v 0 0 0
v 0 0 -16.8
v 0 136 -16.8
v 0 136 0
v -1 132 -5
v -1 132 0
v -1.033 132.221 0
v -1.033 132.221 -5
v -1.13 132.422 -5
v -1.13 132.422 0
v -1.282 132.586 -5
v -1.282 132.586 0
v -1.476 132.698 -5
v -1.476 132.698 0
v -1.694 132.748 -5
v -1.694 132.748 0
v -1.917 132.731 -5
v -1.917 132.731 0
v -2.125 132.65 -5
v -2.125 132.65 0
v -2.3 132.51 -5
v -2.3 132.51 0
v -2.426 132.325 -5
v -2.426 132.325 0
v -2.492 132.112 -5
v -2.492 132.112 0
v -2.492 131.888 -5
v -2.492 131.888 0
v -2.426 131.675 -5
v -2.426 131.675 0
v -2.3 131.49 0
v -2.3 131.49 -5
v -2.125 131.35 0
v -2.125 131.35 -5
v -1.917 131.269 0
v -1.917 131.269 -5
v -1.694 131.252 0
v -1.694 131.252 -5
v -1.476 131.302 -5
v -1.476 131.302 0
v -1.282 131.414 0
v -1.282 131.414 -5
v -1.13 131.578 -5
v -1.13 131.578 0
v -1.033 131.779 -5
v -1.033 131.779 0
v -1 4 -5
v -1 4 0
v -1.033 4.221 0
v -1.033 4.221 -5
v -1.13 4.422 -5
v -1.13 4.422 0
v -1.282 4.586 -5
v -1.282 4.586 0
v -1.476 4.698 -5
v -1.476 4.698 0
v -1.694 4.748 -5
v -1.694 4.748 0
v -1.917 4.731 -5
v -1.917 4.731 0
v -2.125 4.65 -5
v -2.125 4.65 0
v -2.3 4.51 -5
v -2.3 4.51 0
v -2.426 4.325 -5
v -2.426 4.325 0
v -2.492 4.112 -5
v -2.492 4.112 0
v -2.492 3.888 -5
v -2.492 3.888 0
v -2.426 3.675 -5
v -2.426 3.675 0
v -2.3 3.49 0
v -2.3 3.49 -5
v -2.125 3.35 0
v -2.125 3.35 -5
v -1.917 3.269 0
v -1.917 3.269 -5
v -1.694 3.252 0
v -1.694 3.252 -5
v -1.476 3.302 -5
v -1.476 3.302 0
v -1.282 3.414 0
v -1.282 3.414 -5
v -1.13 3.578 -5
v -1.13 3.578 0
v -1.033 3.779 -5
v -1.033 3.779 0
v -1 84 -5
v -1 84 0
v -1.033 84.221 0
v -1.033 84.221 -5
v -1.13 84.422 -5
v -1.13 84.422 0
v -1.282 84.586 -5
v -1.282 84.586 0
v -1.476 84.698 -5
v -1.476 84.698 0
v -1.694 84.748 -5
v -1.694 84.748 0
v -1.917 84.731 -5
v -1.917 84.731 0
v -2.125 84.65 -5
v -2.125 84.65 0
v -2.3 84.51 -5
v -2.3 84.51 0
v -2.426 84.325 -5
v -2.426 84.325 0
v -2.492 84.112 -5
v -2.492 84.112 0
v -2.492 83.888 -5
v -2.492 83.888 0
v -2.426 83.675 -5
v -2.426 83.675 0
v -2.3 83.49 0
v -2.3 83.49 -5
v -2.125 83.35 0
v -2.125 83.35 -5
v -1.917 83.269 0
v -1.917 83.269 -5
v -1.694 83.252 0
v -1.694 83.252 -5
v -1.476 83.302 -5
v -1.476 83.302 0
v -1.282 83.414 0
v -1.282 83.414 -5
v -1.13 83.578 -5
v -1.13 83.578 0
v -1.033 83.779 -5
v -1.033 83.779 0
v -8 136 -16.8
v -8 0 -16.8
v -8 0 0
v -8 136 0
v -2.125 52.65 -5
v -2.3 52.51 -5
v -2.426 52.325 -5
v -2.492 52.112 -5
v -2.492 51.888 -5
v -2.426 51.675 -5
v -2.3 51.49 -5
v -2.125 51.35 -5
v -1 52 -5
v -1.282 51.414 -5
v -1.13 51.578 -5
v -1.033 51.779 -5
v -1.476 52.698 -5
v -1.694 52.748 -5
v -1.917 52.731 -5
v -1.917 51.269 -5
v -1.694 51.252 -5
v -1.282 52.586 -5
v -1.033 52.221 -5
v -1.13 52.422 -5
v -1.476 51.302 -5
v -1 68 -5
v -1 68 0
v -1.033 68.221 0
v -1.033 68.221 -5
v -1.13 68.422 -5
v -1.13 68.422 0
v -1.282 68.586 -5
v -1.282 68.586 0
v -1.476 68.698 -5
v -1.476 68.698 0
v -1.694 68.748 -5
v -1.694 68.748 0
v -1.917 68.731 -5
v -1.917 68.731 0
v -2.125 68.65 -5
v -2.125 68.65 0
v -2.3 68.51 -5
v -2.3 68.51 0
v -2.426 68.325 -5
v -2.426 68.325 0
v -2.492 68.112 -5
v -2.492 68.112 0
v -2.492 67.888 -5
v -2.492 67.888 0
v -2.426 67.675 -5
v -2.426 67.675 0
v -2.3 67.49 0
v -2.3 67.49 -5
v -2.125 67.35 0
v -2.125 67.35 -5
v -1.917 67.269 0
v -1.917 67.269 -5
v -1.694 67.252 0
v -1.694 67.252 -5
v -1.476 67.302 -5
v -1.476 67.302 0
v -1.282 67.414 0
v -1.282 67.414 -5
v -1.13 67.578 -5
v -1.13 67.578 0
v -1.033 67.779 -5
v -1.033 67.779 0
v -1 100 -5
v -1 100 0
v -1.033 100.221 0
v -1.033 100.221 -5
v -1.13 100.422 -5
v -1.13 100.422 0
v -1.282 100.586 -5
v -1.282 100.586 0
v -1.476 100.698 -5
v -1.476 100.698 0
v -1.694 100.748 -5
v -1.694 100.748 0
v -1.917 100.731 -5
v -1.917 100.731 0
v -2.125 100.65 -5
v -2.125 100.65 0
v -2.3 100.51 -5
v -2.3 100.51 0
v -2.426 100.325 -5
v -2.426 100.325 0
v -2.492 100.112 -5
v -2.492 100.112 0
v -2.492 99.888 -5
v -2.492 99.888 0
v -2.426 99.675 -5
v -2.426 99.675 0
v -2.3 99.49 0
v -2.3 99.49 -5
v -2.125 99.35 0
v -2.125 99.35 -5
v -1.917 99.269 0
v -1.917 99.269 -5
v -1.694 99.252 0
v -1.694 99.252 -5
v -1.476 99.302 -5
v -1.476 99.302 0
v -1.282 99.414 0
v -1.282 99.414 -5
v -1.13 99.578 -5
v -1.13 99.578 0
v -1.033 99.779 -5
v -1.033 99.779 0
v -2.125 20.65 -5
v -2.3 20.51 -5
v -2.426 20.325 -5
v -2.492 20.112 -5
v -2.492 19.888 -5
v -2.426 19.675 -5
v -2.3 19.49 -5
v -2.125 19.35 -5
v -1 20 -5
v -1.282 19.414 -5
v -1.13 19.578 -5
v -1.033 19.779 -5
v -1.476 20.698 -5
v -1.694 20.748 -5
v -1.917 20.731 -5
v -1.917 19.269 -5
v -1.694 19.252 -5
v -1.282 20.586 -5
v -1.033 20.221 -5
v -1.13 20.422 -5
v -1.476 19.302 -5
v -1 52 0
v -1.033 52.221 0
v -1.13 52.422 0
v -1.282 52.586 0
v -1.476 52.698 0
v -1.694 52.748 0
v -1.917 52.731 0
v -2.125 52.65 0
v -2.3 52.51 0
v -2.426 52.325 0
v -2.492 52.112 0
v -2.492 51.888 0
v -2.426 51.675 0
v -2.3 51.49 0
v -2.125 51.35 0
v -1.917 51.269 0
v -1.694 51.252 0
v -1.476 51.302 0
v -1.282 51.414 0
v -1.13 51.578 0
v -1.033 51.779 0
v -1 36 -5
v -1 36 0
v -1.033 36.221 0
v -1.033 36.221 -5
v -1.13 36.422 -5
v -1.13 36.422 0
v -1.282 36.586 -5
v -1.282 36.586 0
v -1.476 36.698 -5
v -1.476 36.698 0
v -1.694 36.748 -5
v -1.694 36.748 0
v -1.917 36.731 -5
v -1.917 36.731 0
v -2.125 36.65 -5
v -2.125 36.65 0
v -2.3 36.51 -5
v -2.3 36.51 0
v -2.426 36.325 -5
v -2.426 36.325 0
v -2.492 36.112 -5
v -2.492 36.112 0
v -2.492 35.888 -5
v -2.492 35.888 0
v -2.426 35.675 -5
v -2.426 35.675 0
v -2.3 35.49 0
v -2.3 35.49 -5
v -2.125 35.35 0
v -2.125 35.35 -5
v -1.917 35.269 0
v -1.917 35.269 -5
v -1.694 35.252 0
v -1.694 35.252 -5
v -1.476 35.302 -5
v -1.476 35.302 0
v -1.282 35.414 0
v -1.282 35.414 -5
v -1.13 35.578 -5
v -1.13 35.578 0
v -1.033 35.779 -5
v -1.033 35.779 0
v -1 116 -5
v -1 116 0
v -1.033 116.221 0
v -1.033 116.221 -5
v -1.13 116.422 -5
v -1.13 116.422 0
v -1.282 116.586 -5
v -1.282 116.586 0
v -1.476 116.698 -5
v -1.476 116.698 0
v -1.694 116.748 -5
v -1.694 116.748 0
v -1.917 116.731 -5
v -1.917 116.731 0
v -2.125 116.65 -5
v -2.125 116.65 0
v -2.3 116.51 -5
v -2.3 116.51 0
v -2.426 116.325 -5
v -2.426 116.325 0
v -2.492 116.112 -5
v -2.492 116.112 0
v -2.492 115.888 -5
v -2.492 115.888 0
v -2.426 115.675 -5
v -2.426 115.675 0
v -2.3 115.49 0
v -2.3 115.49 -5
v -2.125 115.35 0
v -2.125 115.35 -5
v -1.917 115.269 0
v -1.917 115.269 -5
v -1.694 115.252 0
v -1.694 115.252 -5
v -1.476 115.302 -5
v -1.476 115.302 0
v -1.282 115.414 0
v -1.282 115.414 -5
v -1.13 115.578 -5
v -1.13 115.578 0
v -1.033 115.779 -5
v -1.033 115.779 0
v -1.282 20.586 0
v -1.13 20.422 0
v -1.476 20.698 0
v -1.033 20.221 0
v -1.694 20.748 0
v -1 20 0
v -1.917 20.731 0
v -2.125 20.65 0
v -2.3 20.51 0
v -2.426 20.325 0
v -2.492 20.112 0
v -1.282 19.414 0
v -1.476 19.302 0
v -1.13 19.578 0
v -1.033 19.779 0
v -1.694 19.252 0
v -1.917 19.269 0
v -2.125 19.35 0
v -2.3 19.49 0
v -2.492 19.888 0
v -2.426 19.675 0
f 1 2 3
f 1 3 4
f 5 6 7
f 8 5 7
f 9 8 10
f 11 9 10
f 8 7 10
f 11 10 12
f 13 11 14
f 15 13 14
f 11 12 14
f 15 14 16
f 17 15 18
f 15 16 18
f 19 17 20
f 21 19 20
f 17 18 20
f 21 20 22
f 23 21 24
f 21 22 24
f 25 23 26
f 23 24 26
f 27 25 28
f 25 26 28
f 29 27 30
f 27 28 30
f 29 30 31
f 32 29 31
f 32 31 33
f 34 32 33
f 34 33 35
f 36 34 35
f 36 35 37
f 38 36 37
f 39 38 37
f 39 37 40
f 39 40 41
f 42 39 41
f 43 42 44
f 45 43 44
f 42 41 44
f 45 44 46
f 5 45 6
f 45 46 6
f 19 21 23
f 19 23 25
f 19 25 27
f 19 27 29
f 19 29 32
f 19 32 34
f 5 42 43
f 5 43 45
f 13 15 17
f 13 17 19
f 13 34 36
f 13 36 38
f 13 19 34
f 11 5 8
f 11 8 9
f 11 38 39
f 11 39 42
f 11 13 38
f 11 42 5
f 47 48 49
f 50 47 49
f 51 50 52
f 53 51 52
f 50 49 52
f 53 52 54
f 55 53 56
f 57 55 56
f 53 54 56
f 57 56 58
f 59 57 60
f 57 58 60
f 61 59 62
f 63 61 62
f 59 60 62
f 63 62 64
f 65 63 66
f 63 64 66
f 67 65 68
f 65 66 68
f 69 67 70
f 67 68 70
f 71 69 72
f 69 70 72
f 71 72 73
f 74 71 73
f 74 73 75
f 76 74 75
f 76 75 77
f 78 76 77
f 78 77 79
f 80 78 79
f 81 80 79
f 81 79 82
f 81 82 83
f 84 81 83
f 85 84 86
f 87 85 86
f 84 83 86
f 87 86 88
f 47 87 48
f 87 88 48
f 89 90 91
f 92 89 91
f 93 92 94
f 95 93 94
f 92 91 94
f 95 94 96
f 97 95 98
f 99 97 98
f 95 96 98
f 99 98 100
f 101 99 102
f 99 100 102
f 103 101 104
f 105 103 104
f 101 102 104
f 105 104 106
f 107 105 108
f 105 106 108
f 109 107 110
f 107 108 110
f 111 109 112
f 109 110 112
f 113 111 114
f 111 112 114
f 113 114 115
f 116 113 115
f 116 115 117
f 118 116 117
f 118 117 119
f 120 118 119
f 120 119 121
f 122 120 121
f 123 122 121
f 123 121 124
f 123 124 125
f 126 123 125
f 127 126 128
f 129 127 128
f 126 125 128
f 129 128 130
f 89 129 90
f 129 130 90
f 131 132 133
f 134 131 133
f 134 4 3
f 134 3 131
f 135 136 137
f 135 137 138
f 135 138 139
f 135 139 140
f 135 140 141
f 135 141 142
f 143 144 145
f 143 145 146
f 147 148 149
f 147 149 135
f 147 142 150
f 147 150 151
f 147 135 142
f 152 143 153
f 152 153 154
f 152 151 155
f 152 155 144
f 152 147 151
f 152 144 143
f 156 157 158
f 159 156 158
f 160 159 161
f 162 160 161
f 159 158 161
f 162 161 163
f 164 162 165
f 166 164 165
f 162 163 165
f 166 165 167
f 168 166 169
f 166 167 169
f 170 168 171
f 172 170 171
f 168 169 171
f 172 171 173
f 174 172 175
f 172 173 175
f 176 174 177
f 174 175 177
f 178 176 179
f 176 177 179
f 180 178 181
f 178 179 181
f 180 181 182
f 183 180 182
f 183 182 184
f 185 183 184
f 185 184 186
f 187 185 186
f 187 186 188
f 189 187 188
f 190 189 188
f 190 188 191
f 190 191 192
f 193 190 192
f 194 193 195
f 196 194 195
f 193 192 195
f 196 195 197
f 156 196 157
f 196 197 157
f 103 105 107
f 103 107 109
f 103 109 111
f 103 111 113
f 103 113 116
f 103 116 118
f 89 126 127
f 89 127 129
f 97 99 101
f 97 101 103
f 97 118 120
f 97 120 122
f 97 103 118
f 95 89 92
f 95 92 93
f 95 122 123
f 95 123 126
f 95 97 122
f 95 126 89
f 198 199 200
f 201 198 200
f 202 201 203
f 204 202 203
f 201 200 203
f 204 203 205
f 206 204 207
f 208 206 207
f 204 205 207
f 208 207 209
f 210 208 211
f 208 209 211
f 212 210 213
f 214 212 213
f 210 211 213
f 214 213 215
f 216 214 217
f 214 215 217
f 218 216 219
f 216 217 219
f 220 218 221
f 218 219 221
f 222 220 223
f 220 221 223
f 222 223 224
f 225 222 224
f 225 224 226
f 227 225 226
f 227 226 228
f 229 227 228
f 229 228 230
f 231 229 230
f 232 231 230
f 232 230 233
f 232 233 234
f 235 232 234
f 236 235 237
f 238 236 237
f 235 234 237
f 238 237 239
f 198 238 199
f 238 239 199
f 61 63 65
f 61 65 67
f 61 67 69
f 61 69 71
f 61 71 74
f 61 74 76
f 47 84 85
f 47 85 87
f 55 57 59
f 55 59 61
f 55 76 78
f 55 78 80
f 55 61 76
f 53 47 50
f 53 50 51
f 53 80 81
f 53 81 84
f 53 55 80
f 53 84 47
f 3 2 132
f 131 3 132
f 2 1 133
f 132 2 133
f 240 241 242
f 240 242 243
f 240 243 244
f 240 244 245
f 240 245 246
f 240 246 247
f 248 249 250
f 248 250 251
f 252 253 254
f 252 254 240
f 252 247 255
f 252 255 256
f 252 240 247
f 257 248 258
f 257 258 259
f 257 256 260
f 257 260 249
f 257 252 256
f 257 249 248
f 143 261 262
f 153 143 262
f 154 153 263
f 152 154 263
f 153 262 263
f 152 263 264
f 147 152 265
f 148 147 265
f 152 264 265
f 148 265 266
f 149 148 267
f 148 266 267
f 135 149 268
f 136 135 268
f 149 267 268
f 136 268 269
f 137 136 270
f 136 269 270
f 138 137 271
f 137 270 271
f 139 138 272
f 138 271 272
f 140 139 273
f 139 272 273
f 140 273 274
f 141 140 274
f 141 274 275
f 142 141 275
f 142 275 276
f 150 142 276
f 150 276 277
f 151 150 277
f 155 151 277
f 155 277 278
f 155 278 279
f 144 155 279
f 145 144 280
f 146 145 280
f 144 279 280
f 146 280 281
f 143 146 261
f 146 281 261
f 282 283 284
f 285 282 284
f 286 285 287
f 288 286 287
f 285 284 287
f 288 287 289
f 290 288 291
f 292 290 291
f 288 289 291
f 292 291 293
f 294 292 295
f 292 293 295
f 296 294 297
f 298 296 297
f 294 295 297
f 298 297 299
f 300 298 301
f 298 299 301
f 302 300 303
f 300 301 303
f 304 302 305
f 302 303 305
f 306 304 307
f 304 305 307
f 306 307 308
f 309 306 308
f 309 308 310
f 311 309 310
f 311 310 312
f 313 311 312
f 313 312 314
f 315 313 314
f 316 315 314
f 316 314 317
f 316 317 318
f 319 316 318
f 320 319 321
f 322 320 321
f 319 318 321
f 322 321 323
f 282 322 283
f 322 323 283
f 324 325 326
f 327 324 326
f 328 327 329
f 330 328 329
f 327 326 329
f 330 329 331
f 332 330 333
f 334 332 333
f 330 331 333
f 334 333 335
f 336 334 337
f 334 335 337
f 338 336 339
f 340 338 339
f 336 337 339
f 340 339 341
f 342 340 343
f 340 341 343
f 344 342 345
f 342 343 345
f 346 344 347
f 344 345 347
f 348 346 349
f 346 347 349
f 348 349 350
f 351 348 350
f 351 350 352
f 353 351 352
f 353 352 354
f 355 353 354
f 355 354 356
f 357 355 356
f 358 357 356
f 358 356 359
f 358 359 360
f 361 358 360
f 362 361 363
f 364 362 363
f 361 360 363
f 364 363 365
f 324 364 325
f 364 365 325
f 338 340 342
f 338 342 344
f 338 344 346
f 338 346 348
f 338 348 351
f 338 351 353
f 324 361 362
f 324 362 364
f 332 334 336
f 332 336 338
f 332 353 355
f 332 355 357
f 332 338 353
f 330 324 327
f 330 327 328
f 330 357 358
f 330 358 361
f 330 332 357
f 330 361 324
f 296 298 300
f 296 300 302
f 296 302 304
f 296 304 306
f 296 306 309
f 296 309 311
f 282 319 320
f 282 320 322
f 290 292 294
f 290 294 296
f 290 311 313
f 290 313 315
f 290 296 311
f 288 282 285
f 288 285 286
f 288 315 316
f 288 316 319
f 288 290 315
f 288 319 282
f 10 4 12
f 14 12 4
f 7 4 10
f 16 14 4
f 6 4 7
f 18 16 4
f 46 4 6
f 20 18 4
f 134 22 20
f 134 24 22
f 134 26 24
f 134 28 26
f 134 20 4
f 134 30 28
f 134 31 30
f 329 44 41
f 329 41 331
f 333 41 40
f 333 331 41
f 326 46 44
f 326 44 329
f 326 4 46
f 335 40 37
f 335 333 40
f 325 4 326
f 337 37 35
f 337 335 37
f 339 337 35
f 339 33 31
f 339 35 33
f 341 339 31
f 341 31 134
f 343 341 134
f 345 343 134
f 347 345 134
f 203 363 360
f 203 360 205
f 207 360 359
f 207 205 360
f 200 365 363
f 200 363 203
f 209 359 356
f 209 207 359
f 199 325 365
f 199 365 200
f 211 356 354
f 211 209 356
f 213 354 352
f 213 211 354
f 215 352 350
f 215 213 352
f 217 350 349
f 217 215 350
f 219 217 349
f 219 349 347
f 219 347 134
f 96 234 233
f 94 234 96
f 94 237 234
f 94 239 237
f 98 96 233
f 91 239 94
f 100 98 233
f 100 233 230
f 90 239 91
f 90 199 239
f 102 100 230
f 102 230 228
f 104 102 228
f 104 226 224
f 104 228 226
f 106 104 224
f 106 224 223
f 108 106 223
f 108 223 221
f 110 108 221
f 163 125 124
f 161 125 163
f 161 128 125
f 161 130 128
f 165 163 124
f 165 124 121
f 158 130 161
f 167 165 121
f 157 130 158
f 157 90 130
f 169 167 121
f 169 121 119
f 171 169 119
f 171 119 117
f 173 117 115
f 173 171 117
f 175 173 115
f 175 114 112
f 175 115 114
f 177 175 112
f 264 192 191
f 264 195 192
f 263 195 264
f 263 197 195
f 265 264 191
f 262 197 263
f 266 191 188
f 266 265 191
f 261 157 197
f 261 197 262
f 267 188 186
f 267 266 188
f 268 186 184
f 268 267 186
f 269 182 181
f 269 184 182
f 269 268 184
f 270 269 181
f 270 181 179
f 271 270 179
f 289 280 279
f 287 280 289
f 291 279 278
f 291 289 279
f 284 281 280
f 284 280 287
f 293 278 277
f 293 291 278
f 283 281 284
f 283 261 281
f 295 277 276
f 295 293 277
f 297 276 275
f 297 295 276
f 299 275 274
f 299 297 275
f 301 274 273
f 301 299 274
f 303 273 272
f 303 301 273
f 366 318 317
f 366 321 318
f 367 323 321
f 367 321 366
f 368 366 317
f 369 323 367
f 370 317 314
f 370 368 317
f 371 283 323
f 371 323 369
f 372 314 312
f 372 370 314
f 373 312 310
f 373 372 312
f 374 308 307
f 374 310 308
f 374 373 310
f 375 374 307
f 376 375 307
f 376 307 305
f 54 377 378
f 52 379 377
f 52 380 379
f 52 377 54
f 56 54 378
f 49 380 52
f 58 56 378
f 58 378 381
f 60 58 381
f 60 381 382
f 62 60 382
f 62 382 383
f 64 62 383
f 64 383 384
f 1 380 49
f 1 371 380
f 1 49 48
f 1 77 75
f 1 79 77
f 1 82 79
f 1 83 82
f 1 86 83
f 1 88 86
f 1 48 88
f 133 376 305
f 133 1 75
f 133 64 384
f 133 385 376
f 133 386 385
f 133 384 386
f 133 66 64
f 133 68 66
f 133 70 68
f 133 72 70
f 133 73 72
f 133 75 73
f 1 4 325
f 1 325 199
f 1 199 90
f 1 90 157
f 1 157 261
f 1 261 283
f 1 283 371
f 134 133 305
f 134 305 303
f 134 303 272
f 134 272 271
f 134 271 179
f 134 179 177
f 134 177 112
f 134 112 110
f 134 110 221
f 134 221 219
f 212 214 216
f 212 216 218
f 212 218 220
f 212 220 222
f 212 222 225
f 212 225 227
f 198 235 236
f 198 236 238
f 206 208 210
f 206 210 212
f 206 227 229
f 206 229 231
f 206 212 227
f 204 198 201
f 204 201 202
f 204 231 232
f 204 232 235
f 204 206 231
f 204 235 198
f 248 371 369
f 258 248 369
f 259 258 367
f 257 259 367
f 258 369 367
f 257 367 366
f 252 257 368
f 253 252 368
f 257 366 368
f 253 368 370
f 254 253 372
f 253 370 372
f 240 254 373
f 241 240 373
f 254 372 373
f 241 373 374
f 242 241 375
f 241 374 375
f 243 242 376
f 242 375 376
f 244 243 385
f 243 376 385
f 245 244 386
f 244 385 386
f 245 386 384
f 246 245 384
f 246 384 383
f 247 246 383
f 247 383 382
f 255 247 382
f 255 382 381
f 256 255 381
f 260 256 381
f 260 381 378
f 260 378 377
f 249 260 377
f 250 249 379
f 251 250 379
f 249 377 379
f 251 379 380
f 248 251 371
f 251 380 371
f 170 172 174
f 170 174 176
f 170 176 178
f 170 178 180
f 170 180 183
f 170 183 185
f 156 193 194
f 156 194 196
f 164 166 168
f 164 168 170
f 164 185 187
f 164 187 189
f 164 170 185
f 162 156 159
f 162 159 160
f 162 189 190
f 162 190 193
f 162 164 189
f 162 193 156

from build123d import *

# Parameters (mm, degrees)
PROFILE_SKETCH_W           = 8
PROFILE_SKETCH_H           = 16.8
PROFILE_EXTRUDE_DEPTH      = 136
INDEX_HOLE_SKETCH_R        = 0.75
FIRST_INDEX_HOLE_CUT_DEPTH = 5
INDEX_HOLE_PATTERN_COUNT   = 9
INDEX_HOLE_PATTERN_PITCH   = 16


with BuildPart() as part:
    # Profile Sketch → Profile Extrude (new body)
    with BuildSketch(Plane(origin=(0.045617437, 0, -0.024209872), x_dir=(-1, 0, 0), z_dir=(0, 1, 0))):
        with Locations((4.045617437, -8.375790128)):
            Rectangle(PROFILE_SKETCH_W, PROFILE_SKETCH_H)
    extrude(amount=PROFILE_EXTRUDE_DEPTH)

    # Index Hole Sketch → First Index Hole Cut (cut)
    with BuildSketch(Plane.XY):
        with Locations((-1.75, 4)):
            Circle(INDEX_HOLE_SKETCH_R)
    first_index_hole_cut = extrude(amount=-FIRST_INDEX_HOLE_CUT_DEPTH, mode=Mode.SUBTRACT)

    # Index Hole Pattern: First Index Hole Cut ×9
    with Locations(*[(0, i * INDEX_HOLE_PATTERN_PITCH, 0) for i in range(1, INDEX_HOLE_PATTERN_COUNT)]):
        add(first_index_hole_cut, mode=Mode.SUBTRACT)


solid = part.part
